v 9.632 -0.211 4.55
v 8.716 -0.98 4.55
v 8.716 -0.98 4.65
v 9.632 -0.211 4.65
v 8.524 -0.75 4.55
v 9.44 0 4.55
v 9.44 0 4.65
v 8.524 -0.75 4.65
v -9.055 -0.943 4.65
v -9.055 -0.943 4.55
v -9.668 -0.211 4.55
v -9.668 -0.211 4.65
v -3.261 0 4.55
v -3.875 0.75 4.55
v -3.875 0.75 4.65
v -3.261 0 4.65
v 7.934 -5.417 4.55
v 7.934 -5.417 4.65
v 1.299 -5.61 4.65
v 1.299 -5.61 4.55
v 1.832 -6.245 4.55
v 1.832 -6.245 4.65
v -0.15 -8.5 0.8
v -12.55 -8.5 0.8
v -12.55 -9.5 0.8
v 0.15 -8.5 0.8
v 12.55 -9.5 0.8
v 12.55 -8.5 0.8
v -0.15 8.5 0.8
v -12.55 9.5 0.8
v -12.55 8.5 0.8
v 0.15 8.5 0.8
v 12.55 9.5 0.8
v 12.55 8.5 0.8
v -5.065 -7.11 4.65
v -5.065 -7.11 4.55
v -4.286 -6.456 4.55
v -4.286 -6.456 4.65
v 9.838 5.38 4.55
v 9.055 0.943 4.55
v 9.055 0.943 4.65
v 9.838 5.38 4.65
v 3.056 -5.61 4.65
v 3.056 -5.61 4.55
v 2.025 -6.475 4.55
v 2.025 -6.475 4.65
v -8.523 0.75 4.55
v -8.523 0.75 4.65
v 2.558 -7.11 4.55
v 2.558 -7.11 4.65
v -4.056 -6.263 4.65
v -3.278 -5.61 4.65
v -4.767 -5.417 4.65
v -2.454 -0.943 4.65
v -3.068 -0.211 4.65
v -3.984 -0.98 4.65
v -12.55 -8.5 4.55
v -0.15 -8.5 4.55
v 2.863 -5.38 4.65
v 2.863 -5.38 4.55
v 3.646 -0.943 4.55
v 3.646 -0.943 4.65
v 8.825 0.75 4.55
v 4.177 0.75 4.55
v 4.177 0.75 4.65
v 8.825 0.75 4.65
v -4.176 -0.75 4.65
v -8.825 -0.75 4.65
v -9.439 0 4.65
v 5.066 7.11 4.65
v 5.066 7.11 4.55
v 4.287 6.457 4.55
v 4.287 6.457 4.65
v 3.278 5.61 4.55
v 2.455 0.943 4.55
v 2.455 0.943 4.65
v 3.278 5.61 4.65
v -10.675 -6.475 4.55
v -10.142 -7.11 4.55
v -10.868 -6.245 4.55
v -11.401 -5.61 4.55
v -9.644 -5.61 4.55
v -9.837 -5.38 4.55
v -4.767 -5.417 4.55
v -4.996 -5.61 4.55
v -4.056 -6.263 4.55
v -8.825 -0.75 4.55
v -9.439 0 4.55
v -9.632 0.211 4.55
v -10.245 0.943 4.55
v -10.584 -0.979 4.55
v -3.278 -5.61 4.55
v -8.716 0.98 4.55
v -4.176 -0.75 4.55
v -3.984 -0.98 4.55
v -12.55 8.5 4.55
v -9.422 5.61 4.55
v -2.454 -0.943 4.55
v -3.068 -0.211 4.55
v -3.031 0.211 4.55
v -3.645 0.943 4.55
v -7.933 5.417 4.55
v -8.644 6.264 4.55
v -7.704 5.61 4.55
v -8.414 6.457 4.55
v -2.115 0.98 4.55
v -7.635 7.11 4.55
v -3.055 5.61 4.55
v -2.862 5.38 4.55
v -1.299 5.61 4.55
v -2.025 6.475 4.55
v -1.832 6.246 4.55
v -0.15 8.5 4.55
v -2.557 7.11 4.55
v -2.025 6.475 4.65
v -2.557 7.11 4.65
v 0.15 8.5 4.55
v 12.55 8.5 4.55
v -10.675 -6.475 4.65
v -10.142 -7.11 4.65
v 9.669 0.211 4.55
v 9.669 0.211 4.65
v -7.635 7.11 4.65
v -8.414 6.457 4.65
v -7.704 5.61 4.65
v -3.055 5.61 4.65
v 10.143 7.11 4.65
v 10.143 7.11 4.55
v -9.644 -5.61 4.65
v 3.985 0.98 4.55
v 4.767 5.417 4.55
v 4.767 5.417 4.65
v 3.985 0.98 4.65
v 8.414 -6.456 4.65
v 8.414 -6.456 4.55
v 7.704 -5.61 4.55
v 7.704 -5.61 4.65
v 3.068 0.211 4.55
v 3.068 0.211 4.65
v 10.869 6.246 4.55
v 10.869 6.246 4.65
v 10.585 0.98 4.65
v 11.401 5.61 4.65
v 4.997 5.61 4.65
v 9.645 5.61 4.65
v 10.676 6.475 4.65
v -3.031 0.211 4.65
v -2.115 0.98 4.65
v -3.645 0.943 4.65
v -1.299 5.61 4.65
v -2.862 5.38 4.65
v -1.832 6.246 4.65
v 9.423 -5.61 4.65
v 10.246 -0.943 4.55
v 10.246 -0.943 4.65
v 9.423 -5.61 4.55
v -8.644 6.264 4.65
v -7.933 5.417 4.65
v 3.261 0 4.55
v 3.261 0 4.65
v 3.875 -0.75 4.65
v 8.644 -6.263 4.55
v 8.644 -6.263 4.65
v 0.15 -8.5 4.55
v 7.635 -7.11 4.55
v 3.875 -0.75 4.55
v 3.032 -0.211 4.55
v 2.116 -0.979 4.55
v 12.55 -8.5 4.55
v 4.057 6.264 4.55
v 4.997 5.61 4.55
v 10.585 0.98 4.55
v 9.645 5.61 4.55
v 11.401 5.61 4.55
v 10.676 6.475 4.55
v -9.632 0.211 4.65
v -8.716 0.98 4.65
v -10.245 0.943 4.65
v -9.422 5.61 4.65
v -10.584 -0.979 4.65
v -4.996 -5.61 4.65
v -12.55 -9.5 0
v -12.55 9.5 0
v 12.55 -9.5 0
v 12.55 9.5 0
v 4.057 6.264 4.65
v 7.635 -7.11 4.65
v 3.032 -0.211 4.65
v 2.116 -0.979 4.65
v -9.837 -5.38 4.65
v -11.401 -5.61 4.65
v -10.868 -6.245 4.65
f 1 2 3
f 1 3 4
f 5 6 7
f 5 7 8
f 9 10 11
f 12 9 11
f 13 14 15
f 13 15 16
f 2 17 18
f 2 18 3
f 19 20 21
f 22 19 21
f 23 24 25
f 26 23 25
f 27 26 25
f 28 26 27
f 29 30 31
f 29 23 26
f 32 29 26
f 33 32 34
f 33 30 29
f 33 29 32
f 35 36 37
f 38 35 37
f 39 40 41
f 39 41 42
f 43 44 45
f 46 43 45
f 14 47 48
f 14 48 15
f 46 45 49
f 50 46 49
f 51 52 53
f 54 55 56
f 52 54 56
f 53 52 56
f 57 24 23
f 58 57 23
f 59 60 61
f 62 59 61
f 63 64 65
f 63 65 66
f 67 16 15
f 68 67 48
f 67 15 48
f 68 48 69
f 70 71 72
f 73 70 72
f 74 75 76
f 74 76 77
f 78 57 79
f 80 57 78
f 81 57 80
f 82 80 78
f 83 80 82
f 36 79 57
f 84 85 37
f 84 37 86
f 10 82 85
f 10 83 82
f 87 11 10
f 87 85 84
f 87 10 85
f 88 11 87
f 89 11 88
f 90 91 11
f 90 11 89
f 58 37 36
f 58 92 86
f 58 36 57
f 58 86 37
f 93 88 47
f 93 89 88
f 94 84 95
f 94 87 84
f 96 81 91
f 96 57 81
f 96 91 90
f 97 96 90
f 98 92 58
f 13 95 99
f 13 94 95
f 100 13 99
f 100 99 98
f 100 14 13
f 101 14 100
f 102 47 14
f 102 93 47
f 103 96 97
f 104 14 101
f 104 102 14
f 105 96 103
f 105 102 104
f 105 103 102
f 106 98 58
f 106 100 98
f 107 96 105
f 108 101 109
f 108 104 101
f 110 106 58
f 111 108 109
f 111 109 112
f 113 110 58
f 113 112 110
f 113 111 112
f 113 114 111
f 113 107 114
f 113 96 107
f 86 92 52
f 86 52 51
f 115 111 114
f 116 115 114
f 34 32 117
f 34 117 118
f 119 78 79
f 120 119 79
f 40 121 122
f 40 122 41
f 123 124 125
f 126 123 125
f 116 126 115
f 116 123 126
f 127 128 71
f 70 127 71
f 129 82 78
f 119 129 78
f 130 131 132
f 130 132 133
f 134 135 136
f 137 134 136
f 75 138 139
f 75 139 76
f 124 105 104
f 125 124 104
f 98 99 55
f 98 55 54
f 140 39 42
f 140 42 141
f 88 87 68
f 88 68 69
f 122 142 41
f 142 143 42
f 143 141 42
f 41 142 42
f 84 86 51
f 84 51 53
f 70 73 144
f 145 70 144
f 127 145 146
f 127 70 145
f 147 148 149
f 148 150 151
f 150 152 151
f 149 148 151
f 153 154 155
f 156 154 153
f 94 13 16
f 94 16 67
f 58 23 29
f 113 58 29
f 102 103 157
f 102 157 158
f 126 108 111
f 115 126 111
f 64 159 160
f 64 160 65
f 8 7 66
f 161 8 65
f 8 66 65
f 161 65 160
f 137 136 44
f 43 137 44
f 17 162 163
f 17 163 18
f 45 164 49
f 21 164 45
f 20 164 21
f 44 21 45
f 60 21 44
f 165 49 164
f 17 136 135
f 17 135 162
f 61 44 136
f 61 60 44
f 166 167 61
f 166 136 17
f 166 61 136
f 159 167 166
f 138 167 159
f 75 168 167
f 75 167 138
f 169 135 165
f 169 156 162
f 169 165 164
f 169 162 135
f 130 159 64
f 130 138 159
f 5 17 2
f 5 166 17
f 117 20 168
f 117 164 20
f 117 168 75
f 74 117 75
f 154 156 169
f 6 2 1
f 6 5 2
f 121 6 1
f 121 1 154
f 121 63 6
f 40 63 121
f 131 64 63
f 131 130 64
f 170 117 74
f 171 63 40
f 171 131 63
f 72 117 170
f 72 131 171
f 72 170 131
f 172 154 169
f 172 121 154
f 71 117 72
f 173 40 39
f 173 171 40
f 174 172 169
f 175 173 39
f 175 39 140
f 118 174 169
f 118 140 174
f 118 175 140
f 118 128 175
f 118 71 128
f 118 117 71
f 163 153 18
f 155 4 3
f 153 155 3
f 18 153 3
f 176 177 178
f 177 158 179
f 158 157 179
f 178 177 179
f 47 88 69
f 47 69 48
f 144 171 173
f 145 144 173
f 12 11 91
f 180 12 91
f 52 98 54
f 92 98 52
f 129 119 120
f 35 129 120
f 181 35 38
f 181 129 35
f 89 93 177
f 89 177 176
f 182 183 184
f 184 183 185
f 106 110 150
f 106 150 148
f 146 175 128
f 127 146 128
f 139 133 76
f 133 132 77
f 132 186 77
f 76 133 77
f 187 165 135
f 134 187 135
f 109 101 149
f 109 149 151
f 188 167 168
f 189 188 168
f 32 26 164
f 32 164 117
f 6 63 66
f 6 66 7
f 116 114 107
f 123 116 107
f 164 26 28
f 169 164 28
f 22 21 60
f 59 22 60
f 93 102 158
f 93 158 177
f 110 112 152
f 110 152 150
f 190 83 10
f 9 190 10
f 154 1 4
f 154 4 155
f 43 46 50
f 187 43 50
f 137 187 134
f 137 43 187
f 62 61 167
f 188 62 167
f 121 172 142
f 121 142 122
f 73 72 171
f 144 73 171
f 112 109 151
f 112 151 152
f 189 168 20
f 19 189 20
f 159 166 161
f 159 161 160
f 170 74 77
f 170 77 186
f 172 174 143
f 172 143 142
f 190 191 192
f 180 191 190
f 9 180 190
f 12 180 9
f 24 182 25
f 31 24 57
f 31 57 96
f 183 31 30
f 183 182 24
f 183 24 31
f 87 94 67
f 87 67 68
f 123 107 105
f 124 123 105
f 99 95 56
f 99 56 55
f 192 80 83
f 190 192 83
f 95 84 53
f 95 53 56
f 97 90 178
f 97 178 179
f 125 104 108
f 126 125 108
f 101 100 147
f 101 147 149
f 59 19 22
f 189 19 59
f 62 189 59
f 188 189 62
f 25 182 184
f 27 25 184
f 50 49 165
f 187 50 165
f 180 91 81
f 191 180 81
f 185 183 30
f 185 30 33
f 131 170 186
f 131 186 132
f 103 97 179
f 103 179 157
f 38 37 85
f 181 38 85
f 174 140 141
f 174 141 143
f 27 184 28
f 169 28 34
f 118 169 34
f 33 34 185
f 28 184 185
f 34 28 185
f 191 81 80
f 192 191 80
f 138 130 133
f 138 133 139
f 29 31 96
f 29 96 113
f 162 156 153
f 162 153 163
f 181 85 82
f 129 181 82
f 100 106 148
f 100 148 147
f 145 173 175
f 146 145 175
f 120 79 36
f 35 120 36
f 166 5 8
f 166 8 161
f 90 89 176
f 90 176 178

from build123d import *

# Parameters (mm, degrees)
SKETCH_1_W      = 25.1
SKETCH_1_H      = 19
EXTRUDE_1_DEPTH = 0.8
SKETCH_2_W      = 12.4
SKETCH_2_H      = 17
EXTRUDE_2_DEPTH = 3.75
EXTRUDE_3_DEPTH = 0.1


with BuildPart() as part:
    # Эскиз1 → Бобышка-Вытянуть1 (new body)
    with BuildSketch(Plane.XY):
        Rectangle(SKETCH_1_W, SKETCH_1_H)
    extrude(amount=EXTRUDE_1_DEPTH)

    # Эскиз2 → Бобышка-Вытянуть2 (add)
    with BuildSketch(Plane.XY.offset(0.8)):
        with Locations((-6.35, 0)):
            Rectangle(SKETCH_2_W, SKETCH_2_H)
        with Locations((6.35, 0)):
            Rectangle(SKETCH_2_W, SKETCH_2_H)
    extrude(amount=EXTRUDE_2_DEPTH)

    # Эскиз3 → Бобышка-Вытянуть3 (add)
    with BuildSketch(Plane.XY.offset(4.55)):
        Polygon((-2.02468415, 6.47520488), (-2.557441739, 7.110113629), (-7.634747282, 7.110113629), (-8.413649878, 6.456542649), (-7.703502871, 5.610259577), (-3.055232199, 5.610259577), align=None)
        Polygon((-1.29882158, 5.610259577), (-2.115441527, 0.979668914), (-3.03146241, 0.211374323), (-3.644937808, 0.942733655), (-2.862323662, 5.380419467), (-1.831775613, 6.245561214), align=None)
        Polygon((-7.933342981, 5.41735104), (-8.715781578, 0.979668914), (-9.631802461, 0.211374323), (-10.245102311, 0.942933785), (-9.422392583, 5.610259577), (-8.643686432, 6.263830557), align=None)
        Polygon((-8.523069486, 0.750025248), (-3.874798814, 0.750025248), (-3.260537626, 0), (-4.176367833, -0.749828804), (-8.824808297, -0.749828804), (-9.438886615, 0), align=None)
        Polygon((-3.984111693, -0.979995723), (-3.06780465, -0.211374323), (-2.454394697, -0.942560314), (-3.277521077, -5.609847275), (-4.056117123, -6.263437667), (-4.766565605, -5.416832984), align=None)
        Polygon((-9.054648407, -0.942737341), (-9.668341145, -0.211177879), (-10.584362029, -0.979472469), (-11.400981975, -5.609866688), (-10.868224387, -6.244775436), (-9.837186085, -5.37955138), align=None)
        Polygon((-4.996497129, -5.609866688), (-9.644374912, -5.609866688), (-10.674989606, -6.475066276), (-10.142165372, -7.110113629), (-5.064859829, -7.110113629), (-4.286153678, -6.456346204), align=None)
        Polygon((10.67560373, 6.47520488), (10.142846141, 7.110113629), (5.065540598, 7.110113629), (4.286638002, 6.456542649), (4.996785009, 5.610259577), (9.64505568, 5.610259577), align=None)
        Polygon((11.4014663, 5.610259577), (10.584846353, 0.979668914), (9.66882547, 0.211374323), (9.055350072, 0.942733655), (9.837964217, 5.380419467), (10.868512267, 6.245561214), align=None)
        Polygon((4.766944899, 5.41735104), (3.984506302, 0.979668914), (3.068485419, 0.211374323), (2.455185569, 0.942933785), (3.277895297, 5.610259577), (4.056601448, 6.263830557), align=None)
        Polygon((4.177218394, 0.750025248), (8.825489066, 0.750025248), (9.439750254, 0), (8.523920047, -0.749828804), (3.875479583, -0.749828804), (3.261401265, 0), align=None)
        Polygon((8.716176187, -0.979995723), (9.63248323, -0.211374323), (10.245893183, -0.942560314), (9.422766803, -5.609847275), (8.644170756, -6.263437667), (7.933722275, -5.416832984), align=None)
        Polygon((3.645639473, -0.942737341), (3.031946734, -0.211177879), (2.115925851, -0.979472469), (1.299305904, -5.609866688), (1.832063493, -6.244775436), (2.863101795, -5.37955138), align=None)
        Polygon((7.70379075, -5.609866688), (3.055912968, -5.609866688), (2.025298274, -6.475066276), (2.558122507, -7.110113629), (7.635428051, -7.110113629), (8.414134202, -6.456346204), align=None)
    extrude(amount=EXTRUDE_3_DEPTH)


solid = part.part
